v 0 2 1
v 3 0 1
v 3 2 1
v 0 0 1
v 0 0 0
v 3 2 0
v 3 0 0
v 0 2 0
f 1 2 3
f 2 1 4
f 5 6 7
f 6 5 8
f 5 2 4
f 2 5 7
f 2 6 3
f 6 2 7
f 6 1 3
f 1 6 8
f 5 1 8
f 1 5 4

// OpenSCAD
//Test do OpenScad
//Crtl+D = Comentar.
//Ctrl+shift+D = Descomentar.
$fn=200;//resolução do meu objeto.

//Transladando enquanto rotaciona:
translate([0,$t*4,0])
rotate([0,$t*90,0])
cube([3,2,1]);
